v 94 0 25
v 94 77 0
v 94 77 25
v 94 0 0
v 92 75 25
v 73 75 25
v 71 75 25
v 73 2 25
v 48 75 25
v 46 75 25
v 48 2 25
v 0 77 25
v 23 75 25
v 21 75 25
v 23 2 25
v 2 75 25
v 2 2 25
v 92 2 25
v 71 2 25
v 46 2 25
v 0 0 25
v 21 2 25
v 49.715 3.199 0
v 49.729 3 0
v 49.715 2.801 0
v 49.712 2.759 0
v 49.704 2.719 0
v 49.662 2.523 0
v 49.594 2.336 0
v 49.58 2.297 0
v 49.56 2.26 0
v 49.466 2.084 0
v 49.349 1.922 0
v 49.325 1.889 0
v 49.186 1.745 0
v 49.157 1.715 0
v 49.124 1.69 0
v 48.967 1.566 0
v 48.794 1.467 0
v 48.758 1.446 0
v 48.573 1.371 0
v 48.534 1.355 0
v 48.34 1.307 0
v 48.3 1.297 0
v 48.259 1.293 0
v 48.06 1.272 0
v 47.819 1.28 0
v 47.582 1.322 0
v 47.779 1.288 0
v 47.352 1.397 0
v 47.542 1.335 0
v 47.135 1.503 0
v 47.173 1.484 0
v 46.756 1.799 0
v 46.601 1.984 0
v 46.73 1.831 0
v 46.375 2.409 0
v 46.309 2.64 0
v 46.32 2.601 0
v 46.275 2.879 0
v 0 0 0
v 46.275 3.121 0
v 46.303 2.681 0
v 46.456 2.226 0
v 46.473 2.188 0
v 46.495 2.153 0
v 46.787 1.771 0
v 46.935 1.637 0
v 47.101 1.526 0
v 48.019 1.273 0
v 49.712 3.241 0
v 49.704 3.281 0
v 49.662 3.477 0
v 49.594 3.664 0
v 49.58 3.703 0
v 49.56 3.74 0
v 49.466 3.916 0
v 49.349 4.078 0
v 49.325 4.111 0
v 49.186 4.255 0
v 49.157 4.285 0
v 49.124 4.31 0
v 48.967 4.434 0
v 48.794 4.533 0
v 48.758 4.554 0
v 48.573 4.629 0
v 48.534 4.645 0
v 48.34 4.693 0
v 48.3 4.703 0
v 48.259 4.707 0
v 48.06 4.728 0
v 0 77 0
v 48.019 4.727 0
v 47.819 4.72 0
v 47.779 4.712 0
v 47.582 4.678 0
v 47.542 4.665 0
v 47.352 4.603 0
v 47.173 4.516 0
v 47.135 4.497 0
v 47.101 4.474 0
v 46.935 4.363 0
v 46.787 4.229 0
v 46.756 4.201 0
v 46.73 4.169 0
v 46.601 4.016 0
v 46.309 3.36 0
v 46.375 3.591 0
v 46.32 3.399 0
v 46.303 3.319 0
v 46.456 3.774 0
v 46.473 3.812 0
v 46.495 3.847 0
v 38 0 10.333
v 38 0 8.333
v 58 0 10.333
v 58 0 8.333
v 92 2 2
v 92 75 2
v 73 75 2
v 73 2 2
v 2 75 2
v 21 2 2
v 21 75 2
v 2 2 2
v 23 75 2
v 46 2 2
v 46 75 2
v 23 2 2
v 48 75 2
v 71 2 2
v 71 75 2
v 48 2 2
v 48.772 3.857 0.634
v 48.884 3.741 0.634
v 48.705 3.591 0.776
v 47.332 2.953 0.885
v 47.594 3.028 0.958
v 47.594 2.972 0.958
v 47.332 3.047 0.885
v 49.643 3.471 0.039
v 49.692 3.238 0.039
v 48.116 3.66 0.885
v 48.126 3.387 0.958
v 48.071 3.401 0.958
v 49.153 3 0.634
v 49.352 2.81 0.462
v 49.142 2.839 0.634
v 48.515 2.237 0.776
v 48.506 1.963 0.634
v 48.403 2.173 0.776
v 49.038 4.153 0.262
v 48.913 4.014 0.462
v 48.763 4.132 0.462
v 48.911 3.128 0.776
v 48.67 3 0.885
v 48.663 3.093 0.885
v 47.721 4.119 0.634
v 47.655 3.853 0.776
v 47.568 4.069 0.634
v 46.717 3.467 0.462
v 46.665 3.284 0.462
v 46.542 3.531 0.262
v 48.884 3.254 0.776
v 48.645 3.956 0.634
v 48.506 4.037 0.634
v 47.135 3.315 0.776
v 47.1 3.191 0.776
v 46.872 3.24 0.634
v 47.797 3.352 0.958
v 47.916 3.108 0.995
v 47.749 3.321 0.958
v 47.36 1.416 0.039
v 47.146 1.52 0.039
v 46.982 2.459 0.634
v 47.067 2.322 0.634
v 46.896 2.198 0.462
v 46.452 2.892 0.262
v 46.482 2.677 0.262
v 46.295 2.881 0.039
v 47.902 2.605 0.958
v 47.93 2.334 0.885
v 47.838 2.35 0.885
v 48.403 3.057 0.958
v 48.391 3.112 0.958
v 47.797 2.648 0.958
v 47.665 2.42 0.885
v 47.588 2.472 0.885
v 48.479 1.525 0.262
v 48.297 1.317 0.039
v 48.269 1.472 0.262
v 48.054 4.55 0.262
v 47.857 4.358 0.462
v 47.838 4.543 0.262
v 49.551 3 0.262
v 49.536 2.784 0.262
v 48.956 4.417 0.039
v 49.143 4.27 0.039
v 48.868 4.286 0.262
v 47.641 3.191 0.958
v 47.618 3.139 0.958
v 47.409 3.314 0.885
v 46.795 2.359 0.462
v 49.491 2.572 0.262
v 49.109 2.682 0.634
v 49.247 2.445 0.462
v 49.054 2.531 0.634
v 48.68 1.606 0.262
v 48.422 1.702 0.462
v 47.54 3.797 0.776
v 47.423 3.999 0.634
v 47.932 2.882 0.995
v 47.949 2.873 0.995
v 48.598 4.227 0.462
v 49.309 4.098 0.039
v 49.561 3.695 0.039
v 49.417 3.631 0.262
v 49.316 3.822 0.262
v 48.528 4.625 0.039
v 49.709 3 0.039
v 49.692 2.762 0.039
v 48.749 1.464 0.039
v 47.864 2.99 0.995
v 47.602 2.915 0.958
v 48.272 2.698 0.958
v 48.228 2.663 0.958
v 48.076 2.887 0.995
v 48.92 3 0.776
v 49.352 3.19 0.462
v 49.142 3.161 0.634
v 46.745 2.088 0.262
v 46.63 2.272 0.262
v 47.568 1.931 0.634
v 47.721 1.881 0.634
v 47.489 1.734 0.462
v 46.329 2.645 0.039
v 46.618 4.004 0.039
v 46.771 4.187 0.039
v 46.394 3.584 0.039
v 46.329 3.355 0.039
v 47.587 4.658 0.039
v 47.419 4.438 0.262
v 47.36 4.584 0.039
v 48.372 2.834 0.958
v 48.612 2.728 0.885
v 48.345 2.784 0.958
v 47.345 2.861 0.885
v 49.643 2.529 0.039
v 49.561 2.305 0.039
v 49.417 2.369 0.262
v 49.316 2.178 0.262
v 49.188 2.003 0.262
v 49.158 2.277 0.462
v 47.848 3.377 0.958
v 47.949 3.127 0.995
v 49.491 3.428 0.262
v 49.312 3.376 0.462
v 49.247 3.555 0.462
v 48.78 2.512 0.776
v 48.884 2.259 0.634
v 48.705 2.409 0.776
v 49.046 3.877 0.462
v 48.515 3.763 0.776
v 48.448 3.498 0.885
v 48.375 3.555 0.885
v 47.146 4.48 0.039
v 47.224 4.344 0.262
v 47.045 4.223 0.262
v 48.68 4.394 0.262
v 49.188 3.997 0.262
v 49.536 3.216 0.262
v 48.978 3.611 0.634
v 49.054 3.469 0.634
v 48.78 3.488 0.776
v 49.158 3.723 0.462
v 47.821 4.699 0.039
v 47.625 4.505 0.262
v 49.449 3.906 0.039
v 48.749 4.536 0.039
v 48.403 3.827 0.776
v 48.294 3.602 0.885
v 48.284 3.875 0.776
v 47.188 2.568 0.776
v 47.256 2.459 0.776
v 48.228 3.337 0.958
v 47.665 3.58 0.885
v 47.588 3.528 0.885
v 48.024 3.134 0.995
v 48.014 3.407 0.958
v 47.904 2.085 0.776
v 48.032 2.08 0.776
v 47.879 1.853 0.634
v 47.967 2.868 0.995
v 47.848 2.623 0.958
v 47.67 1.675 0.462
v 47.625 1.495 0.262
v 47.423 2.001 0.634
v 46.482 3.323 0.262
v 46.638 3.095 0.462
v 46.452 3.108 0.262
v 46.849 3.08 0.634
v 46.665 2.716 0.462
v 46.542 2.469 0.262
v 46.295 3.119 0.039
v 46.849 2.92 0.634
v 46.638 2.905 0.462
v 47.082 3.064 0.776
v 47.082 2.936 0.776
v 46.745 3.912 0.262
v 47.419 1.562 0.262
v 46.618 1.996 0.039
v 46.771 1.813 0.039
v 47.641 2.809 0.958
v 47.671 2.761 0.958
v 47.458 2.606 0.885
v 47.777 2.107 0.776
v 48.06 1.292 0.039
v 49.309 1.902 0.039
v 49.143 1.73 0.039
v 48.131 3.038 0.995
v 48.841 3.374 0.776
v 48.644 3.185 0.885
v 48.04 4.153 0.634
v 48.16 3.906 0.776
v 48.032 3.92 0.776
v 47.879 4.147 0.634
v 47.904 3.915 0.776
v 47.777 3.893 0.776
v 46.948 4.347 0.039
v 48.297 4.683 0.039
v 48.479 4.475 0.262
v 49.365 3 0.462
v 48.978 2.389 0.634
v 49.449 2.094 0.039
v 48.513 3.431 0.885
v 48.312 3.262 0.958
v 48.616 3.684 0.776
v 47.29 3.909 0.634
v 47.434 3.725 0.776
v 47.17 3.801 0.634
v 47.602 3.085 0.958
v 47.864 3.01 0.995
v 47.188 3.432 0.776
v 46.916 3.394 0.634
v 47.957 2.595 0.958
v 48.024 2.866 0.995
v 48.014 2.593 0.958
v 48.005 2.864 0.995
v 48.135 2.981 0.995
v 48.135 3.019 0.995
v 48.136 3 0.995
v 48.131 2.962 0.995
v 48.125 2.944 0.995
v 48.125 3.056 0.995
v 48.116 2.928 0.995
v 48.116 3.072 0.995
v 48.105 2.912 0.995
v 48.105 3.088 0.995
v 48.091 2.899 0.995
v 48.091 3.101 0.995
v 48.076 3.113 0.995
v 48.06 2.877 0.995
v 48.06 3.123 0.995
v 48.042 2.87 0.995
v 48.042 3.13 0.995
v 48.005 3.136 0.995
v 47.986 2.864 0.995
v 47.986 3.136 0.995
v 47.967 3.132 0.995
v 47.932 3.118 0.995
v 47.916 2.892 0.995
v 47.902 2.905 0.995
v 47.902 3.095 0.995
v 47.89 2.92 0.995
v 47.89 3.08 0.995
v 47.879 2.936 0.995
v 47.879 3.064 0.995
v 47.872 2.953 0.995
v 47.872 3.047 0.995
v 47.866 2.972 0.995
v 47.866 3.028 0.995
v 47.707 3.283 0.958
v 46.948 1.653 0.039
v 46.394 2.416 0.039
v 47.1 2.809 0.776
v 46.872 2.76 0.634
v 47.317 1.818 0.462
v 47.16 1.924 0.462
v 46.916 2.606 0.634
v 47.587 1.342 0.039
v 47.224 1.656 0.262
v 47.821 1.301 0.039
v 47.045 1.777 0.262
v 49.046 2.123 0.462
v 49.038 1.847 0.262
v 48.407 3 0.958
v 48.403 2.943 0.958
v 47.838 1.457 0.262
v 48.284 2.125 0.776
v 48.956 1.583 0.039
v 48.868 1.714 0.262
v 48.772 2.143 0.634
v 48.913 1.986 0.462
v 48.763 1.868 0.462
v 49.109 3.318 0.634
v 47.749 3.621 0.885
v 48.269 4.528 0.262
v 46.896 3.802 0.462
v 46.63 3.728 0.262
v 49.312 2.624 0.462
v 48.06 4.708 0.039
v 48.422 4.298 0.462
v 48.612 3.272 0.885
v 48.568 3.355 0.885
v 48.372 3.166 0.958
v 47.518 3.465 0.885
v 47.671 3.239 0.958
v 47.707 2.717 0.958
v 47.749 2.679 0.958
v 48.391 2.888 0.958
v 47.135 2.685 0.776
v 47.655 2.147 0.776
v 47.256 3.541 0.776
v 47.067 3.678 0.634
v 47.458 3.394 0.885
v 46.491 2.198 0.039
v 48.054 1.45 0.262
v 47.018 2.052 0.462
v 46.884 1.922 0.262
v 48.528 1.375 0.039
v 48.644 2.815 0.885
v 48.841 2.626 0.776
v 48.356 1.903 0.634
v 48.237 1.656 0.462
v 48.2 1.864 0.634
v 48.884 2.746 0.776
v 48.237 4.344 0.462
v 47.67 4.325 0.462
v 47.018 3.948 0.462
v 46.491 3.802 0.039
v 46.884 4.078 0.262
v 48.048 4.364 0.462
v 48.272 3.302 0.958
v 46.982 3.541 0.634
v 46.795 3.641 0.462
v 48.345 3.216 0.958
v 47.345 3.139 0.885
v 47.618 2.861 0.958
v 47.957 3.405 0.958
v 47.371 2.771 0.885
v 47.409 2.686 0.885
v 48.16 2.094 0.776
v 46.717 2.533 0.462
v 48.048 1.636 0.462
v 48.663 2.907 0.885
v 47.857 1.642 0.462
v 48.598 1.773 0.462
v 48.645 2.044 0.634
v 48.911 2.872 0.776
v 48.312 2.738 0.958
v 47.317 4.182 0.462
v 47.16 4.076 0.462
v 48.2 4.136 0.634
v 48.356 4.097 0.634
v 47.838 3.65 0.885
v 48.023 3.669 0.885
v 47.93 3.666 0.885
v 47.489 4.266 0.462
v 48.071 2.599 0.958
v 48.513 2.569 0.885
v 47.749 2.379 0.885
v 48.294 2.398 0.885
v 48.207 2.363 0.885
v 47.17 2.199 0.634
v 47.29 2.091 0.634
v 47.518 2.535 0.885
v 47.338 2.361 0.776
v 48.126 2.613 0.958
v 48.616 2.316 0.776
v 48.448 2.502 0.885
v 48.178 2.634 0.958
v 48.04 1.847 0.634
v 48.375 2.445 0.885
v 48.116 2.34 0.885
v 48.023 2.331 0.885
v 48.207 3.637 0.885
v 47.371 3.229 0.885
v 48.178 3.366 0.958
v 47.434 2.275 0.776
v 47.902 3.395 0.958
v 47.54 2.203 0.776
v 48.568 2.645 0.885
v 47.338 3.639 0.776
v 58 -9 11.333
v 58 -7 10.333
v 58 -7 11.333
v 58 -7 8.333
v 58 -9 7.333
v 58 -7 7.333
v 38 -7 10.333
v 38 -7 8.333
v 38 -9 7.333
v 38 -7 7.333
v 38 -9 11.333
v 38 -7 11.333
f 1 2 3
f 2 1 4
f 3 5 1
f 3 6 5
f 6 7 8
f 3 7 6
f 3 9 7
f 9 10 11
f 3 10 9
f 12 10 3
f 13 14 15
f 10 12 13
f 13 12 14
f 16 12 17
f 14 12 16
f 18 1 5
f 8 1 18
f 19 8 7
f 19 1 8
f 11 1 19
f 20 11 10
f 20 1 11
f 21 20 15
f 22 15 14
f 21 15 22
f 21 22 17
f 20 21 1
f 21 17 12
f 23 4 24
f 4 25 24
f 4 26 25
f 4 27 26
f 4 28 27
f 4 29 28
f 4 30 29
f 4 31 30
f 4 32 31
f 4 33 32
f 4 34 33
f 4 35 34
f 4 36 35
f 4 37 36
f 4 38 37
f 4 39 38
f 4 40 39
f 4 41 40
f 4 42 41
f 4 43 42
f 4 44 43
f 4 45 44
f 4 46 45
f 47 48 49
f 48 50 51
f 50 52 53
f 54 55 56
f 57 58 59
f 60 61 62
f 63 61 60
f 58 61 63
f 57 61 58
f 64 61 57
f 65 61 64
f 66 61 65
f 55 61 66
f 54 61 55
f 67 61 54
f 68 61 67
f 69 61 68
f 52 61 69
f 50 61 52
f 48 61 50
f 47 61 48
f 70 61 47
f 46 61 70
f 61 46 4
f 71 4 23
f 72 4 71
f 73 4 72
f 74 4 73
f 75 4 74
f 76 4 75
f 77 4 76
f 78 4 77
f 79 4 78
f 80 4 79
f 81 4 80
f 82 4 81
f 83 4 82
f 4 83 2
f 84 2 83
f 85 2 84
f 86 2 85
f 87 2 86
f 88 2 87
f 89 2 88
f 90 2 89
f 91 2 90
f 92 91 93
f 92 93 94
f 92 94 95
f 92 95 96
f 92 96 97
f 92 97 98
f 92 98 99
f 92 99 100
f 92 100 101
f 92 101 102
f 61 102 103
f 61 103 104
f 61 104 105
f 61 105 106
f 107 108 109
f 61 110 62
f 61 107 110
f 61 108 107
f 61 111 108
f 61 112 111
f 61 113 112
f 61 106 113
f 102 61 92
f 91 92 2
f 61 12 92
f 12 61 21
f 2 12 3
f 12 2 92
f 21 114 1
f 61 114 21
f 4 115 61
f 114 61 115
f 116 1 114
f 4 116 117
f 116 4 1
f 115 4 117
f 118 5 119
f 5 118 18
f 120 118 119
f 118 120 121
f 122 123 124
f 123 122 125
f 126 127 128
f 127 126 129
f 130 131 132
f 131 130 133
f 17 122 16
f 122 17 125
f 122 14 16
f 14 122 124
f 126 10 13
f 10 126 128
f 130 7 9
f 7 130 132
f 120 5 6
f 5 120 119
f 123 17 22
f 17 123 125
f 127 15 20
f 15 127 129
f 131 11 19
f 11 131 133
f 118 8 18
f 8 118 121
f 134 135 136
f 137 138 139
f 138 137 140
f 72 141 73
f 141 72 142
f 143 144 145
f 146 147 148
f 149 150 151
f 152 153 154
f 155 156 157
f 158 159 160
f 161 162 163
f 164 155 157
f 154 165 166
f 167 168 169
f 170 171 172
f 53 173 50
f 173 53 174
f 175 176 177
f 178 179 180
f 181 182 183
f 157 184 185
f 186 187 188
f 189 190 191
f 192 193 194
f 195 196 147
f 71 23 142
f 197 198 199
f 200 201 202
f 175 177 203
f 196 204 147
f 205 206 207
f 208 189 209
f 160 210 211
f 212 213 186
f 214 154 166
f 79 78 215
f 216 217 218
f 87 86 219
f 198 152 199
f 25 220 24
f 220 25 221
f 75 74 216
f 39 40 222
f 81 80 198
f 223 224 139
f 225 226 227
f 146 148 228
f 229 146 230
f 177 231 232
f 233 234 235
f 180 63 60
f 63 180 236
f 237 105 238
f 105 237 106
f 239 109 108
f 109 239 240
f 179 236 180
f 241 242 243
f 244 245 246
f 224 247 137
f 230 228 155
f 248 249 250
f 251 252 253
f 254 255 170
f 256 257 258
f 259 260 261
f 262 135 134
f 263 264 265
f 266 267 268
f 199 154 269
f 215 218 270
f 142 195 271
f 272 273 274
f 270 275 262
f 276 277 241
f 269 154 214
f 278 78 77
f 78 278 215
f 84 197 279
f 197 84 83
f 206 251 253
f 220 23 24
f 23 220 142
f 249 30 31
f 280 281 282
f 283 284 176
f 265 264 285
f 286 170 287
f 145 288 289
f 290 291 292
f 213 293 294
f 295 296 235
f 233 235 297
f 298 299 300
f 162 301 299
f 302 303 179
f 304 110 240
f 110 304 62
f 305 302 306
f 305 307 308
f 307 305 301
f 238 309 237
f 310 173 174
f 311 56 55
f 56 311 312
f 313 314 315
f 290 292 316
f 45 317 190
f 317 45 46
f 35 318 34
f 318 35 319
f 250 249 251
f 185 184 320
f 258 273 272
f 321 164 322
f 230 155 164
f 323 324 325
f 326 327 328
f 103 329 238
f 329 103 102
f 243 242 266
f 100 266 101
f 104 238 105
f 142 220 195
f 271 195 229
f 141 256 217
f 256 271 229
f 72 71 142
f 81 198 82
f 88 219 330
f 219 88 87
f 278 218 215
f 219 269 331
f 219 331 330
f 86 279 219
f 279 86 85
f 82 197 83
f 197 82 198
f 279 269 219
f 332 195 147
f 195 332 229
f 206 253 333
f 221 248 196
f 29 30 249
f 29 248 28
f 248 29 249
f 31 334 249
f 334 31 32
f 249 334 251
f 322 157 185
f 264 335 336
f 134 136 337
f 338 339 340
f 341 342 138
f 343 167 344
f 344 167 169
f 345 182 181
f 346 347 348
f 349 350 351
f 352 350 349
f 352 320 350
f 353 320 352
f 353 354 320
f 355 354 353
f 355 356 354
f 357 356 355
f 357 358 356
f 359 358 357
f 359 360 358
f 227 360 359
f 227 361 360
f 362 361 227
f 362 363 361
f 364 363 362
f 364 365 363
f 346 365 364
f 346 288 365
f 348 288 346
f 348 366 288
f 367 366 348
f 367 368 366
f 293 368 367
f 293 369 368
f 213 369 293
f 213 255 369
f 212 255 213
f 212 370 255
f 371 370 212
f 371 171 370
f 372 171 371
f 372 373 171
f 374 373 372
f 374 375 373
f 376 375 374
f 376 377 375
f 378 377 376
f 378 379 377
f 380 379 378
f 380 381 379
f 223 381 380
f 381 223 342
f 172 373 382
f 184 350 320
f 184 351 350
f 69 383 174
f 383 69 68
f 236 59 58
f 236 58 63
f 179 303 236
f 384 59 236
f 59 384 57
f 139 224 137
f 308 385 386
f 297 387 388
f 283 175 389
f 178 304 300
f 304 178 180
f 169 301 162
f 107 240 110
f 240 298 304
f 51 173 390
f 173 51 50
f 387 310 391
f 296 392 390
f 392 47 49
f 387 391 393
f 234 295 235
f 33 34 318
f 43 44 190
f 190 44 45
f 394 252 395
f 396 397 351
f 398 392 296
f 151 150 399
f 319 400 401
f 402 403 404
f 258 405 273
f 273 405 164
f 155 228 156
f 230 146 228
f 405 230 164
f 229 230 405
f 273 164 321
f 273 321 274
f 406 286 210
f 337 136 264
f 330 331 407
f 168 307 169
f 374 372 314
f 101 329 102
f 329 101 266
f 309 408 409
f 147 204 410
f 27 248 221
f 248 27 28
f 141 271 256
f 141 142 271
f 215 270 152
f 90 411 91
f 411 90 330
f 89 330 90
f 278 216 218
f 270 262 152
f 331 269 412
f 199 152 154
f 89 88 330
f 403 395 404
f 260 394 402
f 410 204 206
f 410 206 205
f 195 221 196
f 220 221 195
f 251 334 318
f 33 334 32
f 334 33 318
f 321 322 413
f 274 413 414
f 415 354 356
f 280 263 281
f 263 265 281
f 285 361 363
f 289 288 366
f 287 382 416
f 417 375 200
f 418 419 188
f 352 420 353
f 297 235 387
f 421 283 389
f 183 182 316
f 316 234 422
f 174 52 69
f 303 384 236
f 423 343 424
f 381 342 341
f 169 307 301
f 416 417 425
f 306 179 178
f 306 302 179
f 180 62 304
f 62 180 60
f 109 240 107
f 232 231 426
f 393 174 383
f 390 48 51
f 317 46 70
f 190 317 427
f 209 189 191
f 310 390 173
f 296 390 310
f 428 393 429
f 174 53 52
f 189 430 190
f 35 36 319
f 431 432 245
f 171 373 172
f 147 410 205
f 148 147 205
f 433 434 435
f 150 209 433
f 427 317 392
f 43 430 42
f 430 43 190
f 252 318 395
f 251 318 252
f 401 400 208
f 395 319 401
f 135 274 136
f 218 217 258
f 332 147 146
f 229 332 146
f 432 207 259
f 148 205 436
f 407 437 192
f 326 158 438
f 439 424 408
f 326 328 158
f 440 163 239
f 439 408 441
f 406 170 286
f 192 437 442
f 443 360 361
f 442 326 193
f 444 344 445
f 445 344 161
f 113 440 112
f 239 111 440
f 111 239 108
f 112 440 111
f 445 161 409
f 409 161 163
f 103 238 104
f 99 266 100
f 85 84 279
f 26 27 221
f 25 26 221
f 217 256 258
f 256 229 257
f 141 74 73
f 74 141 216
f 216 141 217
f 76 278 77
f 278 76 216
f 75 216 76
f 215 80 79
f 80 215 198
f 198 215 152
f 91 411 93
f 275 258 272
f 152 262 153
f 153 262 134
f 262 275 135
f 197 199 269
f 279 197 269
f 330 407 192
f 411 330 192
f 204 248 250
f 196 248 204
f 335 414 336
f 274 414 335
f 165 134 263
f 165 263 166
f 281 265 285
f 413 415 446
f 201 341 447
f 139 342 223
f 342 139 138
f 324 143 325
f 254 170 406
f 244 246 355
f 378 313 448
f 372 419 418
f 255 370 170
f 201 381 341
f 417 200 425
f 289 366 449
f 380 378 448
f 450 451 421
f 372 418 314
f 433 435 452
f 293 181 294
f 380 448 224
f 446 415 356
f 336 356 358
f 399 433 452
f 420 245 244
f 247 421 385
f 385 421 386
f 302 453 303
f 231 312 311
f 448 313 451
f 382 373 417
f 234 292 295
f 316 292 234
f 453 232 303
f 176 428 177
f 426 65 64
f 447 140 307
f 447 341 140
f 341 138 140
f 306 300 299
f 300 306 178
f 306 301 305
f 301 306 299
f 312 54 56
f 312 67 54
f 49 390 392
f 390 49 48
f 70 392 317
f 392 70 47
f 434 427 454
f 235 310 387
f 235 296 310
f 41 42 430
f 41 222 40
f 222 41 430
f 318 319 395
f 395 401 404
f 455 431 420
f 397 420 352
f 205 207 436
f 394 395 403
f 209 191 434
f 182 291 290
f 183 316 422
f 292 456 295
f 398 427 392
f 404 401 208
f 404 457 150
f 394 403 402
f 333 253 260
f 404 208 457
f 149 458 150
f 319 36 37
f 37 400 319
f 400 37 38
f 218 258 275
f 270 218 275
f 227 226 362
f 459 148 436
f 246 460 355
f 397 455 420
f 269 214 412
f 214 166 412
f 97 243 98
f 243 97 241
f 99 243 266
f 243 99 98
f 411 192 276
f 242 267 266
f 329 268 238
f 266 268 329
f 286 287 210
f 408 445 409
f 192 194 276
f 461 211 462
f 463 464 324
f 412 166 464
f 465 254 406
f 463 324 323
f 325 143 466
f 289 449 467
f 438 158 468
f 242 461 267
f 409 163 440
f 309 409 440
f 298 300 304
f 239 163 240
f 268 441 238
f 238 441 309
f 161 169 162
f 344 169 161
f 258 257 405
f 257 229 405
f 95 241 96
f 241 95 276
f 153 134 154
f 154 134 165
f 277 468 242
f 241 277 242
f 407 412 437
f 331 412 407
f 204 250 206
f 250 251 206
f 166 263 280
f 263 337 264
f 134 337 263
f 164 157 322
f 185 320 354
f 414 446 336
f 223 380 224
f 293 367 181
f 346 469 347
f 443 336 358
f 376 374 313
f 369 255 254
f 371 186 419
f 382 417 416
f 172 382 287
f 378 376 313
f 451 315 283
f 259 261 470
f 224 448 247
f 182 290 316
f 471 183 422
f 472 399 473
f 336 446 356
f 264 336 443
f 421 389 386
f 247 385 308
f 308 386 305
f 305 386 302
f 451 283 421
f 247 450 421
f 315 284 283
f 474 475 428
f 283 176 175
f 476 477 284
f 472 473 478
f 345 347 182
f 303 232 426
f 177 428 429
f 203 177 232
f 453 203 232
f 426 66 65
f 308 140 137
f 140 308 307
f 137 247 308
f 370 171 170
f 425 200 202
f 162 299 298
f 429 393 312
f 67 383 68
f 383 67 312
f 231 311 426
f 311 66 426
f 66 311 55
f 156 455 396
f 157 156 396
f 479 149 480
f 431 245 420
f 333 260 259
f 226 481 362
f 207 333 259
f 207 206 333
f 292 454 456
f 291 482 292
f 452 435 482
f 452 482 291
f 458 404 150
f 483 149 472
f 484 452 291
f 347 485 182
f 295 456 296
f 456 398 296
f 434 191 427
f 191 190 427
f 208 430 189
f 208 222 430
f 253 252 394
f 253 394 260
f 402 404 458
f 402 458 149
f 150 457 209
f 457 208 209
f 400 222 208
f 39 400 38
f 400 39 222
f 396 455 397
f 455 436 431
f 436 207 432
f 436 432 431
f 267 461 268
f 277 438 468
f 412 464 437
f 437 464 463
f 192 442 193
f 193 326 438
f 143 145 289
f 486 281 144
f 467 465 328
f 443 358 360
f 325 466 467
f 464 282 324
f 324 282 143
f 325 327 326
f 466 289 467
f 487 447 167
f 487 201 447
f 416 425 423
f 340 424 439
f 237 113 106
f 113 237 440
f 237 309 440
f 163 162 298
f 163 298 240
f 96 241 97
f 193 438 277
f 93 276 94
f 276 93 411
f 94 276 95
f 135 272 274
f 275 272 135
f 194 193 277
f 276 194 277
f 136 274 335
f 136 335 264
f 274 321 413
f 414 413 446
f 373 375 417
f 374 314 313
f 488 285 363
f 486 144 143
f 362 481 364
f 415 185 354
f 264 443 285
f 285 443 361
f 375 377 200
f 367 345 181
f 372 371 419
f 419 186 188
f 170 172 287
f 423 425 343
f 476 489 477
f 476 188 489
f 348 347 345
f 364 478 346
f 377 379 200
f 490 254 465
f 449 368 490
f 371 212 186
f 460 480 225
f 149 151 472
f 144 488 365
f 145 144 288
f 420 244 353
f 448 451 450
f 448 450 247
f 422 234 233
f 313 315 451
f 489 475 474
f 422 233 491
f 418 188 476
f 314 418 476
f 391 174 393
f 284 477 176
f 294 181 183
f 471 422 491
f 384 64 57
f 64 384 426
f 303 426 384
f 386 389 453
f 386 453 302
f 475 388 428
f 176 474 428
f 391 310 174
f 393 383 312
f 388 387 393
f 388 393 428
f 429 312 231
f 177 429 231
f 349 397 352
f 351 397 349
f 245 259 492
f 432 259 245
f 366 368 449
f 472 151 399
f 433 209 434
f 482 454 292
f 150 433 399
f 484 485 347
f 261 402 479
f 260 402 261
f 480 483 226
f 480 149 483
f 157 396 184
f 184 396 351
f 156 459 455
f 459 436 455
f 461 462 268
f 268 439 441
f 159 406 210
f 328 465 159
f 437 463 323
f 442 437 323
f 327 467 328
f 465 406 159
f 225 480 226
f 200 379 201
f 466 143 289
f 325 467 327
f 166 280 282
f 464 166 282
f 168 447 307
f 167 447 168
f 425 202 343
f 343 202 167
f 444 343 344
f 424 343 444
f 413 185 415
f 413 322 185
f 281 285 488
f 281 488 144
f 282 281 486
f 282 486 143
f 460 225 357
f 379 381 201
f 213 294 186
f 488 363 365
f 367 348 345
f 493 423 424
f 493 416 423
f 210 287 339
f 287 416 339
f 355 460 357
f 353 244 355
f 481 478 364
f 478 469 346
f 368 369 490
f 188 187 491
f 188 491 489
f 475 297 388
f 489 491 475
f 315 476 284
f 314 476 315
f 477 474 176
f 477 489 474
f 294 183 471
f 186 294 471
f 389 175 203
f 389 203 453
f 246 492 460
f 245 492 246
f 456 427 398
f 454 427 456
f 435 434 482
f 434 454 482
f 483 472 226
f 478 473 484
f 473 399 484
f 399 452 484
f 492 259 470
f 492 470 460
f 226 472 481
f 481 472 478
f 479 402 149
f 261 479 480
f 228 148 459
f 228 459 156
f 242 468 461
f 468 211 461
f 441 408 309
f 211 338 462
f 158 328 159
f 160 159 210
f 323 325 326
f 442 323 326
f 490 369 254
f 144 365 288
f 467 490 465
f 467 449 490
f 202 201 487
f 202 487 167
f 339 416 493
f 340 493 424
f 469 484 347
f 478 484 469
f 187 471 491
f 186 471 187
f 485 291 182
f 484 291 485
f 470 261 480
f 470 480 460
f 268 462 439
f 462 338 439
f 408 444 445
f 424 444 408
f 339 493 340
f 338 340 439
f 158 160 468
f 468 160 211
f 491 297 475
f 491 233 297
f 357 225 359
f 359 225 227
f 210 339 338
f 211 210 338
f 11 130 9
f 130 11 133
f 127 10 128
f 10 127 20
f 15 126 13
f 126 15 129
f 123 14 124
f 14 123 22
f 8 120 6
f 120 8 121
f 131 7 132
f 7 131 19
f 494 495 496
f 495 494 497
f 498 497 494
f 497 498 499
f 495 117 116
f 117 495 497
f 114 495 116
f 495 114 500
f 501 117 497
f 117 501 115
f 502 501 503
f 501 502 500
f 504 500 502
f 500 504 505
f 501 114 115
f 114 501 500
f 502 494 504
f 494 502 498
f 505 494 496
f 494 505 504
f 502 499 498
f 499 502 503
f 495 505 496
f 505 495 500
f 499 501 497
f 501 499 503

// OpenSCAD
$fn = 45;

DRAWER_HEIGHT = 25;  
CABINET_WIDTH = 100; // adjustable from ~30-200
CABINET_DEPTH = 80;  // adjustable from ~50-200

// drawer 4, 3 dividers
difference() {
    translate([0,0,0]) cube([CABINET_WIDTH - 6, CABINET_DEPTH - 3, DRAWER_HEIGHT]);
    translate([2,2,2]) cube([CABINET_WIDTH - 10, CABINET_DEPTH - 7, DRAWER_HEIGHT]); 
    translate([(CABINET_WIDTH / 2) - 2, 3, -1]) sphere(2);
}

// dividers
    translate([(CABINET_WIDTH / 4) - 4,2,0]) cube([2, CABINET_DEPTH - 7, DRAWER_HEIGHT]);
    difference() {
        translate([(CABINET_WIDTH / 4) * 2 - 4, 2,0]) cube([2, CABINET_DEPTH - 7, DRAWER_HEIGHT]);
        translate([(CABINET_WIDTH / 2) - 2, 3, -1]) sphere(2);
    }
    translate([(CABINET_WIDTH / 4) * 3 - 4,2,0]) cube([2, CABINET_DEPTH - 7, DRAWER_HEIGHT]);

// pull handle
translate([(CABINET_WIDTH / 2) - 12,-9,(DRAWER_HEIGHT / 3)]) cube([20, 10, 2]);
translate([(CABINET_WIDTH / 2) - 12,-9,(DRAWER_HEIGHT / 3) -1]) cube([20, 2, 4]);
